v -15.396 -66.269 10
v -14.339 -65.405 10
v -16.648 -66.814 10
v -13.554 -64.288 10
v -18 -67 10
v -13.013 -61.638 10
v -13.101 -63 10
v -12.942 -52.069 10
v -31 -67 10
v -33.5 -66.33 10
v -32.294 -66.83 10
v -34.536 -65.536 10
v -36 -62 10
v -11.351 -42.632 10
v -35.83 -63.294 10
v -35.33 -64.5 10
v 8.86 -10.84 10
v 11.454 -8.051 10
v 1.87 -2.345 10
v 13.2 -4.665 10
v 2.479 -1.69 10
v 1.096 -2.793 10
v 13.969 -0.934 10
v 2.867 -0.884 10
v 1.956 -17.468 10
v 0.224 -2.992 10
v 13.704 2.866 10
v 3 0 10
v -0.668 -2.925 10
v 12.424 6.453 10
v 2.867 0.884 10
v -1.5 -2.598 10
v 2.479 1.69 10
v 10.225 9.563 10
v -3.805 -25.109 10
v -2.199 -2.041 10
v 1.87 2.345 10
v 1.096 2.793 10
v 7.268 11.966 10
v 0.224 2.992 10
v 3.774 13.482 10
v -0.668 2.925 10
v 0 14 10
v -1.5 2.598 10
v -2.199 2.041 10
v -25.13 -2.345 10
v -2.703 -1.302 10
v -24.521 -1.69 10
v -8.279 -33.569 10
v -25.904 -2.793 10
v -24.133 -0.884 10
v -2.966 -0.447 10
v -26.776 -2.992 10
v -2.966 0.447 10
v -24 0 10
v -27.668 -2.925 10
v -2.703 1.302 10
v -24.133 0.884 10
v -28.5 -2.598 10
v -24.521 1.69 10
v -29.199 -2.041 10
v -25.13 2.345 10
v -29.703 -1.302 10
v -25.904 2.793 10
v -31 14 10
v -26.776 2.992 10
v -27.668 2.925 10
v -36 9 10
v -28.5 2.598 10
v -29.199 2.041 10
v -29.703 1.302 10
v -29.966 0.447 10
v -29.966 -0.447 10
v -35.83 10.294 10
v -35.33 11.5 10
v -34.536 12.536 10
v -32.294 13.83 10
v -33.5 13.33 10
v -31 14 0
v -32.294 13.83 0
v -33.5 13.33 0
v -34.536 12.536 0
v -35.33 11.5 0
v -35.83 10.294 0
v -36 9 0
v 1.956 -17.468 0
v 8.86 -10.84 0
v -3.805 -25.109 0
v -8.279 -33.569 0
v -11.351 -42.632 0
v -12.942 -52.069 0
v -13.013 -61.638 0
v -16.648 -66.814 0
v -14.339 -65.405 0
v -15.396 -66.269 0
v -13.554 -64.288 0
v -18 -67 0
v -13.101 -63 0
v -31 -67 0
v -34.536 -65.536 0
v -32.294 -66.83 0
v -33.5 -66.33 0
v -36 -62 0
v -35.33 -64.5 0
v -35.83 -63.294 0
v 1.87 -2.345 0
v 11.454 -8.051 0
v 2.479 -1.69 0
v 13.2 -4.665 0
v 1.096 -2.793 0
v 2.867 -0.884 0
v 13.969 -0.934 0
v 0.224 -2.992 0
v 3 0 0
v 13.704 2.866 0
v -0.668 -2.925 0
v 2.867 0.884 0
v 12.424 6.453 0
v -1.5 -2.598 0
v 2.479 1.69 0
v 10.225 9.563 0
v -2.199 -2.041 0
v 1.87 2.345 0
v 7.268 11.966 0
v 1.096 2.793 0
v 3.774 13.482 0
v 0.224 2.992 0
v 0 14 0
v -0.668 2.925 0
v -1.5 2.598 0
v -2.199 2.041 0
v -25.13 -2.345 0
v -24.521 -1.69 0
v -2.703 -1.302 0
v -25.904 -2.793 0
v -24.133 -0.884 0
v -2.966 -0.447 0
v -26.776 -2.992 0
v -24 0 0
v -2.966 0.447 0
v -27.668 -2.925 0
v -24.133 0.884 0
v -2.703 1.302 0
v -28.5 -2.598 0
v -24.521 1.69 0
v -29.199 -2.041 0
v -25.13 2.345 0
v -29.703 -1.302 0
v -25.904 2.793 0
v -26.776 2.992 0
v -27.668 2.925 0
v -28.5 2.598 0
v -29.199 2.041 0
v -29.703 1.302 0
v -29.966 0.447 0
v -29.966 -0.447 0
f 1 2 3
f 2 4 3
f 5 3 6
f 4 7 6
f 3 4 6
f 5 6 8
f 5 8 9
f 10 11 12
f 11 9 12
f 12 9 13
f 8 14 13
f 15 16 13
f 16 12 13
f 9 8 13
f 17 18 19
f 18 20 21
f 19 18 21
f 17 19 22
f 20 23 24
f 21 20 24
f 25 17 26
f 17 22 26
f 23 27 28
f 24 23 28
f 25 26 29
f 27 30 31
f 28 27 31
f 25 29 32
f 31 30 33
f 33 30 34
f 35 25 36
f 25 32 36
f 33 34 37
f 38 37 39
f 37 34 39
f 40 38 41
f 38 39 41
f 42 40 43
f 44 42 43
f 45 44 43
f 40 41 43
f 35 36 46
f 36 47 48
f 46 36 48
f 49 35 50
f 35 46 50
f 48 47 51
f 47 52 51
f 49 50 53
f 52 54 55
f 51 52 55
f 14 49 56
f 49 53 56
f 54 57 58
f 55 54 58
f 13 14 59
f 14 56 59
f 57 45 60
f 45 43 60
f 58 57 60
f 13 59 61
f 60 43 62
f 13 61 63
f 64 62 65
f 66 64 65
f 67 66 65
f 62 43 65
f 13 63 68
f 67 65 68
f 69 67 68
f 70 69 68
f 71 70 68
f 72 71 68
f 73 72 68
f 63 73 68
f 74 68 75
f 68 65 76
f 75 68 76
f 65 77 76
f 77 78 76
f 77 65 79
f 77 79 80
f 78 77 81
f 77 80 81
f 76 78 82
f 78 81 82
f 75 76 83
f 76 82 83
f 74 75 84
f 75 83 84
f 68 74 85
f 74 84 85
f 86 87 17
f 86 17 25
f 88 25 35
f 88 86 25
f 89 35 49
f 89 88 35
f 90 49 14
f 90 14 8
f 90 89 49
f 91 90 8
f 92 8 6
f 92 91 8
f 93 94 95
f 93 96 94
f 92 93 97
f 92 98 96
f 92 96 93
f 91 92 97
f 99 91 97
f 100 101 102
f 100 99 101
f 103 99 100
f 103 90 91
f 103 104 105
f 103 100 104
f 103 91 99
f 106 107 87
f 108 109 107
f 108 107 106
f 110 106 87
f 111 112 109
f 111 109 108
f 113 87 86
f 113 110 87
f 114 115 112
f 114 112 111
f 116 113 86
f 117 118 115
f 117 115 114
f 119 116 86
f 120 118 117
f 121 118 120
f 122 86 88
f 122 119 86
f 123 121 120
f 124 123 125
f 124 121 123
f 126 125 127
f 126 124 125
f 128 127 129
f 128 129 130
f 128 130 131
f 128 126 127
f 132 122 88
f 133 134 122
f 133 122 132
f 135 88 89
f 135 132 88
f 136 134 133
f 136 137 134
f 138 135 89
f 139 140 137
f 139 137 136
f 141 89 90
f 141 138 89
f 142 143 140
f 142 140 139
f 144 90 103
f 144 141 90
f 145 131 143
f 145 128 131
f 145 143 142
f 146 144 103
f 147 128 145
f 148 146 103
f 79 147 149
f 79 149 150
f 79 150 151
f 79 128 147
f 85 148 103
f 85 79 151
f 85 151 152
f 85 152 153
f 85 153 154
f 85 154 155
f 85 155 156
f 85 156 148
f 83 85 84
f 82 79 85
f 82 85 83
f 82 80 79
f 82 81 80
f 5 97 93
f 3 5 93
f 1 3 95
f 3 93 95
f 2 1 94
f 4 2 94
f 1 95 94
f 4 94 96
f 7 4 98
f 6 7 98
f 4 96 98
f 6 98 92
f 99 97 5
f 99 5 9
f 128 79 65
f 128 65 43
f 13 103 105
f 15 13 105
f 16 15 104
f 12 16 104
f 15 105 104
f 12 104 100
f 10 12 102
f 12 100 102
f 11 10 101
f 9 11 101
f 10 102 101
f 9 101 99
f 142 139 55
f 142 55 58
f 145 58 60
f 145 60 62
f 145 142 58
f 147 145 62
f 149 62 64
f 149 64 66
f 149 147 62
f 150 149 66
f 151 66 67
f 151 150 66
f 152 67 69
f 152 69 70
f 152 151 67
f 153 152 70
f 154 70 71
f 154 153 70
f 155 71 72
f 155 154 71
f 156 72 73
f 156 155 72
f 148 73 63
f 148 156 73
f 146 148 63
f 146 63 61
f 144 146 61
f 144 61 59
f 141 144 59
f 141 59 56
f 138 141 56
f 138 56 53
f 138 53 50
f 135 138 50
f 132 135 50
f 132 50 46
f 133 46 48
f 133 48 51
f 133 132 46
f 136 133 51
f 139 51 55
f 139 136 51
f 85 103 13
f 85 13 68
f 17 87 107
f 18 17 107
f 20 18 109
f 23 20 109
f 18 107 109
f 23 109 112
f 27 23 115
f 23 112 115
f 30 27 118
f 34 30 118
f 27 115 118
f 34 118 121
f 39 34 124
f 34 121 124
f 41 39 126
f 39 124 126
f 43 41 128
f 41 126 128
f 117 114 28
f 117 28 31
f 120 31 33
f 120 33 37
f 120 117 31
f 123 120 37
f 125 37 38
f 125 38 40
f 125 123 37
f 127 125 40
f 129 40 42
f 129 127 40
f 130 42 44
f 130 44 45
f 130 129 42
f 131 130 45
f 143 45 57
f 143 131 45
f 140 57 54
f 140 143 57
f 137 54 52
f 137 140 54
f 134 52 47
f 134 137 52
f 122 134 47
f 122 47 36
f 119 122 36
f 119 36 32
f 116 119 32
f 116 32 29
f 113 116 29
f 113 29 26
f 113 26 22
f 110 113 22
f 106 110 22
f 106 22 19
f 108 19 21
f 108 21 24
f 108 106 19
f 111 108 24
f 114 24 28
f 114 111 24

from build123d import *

# Parameters (mm, degrees)
SKETCH_R  = 3
PAD_DEPTH = 10


with BuildPart() as part:
    # Sketch → Pad (new body)
    with BuildSketch(Plane.XY):
        with BuildLine():
            Line((-31, 14), (0, 14))
            ThreePointArc((8.85963, -10.840063), (13.186373, 4.703144), (0, 14))
            ThreePointArc((8.85963, -10.840063), (-8.278867, -33.56864), (-13.013103, -61.638256))
            ThreePointArc((-18, -67), (-14.338803, -65.405237), (-13.013103, -61.638256))
            Line((-18, -67), (-31, -67))
            ThreePointArc((-36, -62), (-34.535534, -65.535534), (-31, -67))
            Line((-36, -62), (-36, 9))
            ThreePointArc((-31, 14), (-34.535534, 12.535534), (-36, 9))
        make_face()
        with Locations((-27, 0)):
            Circle(SKETCH_R, mode=Mode.SUBTRACT)
        Circle(SKETCH_R, mode=Mode.SUBTRACT)
    extrude(amount=PAD_DEPTH)


solid = part.part
